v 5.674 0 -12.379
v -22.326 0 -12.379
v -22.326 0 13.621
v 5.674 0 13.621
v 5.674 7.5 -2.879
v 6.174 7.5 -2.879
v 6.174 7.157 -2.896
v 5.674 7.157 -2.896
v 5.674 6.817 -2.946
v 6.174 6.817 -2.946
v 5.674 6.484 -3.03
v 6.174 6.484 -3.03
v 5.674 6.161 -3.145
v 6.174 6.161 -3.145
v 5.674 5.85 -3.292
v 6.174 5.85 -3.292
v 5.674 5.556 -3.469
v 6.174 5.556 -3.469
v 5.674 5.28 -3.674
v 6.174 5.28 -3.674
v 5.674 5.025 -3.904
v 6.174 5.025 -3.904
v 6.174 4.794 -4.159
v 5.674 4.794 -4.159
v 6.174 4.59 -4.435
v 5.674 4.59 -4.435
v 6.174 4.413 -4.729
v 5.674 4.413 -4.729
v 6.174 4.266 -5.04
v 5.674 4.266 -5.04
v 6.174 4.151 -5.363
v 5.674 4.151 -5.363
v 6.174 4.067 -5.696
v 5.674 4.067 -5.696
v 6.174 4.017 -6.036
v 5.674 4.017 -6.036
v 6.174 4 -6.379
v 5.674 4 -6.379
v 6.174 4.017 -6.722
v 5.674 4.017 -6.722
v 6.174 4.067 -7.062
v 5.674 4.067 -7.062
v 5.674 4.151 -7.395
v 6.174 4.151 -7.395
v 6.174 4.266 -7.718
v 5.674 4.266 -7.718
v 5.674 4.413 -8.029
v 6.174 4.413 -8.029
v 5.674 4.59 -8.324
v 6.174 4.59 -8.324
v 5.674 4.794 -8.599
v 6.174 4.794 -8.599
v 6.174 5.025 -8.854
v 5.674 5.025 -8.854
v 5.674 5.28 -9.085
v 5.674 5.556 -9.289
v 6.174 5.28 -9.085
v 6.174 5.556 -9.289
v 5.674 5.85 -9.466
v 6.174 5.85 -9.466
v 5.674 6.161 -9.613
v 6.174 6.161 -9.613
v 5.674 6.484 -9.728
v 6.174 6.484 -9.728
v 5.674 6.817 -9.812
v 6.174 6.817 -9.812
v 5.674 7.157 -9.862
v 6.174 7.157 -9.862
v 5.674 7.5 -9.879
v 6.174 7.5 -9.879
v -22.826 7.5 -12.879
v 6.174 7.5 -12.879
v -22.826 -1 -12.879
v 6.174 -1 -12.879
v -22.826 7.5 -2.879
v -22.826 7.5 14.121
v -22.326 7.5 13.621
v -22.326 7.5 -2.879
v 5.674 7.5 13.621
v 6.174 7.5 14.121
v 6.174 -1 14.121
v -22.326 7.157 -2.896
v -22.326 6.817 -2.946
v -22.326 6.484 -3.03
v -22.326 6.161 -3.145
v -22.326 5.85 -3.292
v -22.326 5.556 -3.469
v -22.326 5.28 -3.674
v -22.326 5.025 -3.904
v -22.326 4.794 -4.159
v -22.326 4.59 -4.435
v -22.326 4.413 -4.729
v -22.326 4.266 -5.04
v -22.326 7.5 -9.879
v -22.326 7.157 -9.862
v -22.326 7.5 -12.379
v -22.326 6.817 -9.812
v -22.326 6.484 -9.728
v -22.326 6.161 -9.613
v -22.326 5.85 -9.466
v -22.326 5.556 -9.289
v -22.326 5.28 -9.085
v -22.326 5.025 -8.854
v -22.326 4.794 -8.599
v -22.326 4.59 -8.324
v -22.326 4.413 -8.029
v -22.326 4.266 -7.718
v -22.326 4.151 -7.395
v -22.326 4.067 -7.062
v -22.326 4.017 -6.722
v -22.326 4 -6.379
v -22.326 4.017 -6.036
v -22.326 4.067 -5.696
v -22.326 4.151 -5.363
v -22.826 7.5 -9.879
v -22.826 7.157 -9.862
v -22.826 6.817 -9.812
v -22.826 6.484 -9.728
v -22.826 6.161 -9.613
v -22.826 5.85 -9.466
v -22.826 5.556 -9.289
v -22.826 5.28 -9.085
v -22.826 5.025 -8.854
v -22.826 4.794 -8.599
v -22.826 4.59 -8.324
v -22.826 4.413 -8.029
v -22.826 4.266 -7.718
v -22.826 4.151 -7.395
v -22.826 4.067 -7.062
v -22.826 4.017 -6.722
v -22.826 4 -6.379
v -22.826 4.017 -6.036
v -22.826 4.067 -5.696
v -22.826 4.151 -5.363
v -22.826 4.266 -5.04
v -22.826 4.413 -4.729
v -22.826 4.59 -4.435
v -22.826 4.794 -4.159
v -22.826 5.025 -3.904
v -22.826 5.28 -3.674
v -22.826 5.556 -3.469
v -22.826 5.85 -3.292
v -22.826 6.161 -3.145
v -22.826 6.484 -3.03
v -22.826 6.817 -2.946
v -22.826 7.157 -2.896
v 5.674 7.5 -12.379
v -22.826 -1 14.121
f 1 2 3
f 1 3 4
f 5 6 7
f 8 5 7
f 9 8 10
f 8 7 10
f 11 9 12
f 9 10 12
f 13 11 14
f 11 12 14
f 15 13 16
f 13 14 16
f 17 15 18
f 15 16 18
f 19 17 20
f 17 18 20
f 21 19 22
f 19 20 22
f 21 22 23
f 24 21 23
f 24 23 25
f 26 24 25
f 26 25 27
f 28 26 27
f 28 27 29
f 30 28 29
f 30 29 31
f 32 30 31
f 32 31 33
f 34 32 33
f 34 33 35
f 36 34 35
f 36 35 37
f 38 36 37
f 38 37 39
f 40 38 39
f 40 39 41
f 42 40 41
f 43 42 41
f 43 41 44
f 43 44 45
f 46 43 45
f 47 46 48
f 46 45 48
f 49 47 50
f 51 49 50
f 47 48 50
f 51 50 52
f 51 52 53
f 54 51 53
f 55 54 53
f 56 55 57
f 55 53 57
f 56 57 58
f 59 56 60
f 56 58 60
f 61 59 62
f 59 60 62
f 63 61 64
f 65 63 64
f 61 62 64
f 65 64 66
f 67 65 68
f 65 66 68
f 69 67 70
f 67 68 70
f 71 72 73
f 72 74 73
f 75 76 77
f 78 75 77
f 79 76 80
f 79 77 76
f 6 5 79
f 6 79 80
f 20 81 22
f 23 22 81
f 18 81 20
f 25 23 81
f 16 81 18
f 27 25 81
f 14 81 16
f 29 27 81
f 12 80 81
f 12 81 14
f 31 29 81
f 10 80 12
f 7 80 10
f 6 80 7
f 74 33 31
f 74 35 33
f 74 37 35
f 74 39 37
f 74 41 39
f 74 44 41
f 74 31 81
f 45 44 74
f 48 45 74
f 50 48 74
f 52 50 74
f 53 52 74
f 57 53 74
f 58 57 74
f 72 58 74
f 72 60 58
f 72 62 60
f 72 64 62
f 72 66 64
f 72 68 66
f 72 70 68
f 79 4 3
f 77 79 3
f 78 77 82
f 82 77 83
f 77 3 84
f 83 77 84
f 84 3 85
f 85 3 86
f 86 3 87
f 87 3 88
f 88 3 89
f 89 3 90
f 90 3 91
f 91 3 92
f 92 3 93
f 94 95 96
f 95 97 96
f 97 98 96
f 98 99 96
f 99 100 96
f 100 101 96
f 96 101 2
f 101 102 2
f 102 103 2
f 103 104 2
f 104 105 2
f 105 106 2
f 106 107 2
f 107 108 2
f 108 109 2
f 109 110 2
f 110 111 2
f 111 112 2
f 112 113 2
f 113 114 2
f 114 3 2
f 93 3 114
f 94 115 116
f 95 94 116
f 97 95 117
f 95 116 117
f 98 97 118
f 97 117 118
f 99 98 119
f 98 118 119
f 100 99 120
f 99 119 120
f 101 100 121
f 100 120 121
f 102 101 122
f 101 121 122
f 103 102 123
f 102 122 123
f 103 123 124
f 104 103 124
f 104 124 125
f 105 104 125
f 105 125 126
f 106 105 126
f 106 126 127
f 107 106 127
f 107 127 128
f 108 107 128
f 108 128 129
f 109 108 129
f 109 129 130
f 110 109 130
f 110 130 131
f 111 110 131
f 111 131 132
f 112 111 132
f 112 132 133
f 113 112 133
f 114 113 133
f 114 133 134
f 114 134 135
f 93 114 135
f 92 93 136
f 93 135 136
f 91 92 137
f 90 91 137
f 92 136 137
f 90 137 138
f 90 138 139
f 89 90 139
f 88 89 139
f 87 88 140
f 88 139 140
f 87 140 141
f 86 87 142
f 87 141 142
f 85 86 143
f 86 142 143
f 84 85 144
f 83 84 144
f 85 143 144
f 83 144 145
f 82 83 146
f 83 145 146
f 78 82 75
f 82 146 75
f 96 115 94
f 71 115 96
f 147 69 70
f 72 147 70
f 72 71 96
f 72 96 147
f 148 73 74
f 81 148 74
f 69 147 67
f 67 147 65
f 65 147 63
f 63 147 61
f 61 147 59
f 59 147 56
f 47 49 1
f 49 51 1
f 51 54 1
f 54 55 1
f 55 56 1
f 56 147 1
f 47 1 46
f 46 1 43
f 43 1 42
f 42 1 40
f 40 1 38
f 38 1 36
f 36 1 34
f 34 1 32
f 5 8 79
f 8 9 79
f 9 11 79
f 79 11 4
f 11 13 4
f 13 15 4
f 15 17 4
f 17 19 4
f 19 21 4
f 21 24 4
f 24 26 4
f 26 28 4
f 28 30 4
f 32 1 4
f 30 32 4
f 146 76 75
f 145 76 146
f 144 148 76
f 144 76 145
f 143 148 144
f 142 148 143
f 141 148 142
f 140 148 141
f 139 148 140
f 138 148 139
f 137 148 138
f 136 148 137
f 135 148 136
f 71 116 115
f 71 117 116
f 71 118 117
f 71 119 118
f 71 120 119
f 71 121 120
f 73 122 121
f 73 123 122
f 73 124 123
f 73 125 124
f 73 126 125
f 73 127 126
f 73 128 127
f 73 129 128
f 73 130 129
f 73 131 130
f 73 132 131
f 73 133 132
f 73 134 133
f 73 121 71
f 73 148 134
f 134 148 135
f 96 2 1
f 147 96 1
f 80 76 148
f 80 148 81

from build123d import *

# Parameters (mm, degrees)
ESQUISSE1_W             = 29
ESQUISSE1_H             = 27
BOSS_EXTRU_1_DEPTH      = 1
BOSS_EXTRU_2_DEPTH      = 7.5
ESQUISSE1_4_W           = 0.5
ESQUISSE1_4_H           = 7
BOSS_EXTRU_3_DEPTH      = 7.5
ESQUISSE7_R             = 3.5
ENL_V_MAT_EXTRU_1_DEPTH = 0.5
ENL_V_START             = -0.5
ESQUISSE6_R             = 3.5
ENL_V_MAT_EXTRU_2_DEPTH = 0.5


with BuildPart() as part:
    # Esquisse1 → Boss.-Extru.1 (new body)
    with BuildSketch(Plane(origin=(0, 0, 0), x_dir=(1, 0, 0), z_dir=(0, 1, 0))):
        with Locations((-8.325581395, -0.620930233)):
            Rectangle(ESQUISSE1_W, ESQUISSE1_H)
    extrude(amount=-BOSS_EXTRU_1_DEPTH)

    # Esquisse1<3> → Boss.-Extru.2 (add)
    with BuildSketch(Plane(origin=(0, 0, 0), x_dir=(1, 0, 0), z_dir=(0, 1, 0))):
        Polygon((-22.325581395, 8.379069767), (-22.325581395, 12.379069767), (5.674418605, 12.379069767), (5.674418605, 6.379069767), (6.174418605, 6.379069767), (6.174418605, 12.879069767), (-22.825581395, 12.879069767), (-22.825581395, 8.379069767), align=None)
        Polygon((-22.325581395, -13.620930233), (-22.325581395, 1.379069767), (-22.825581395, 1.379069767), (-22.825581395, -14.120930233), (6.174418605, -14.120930233), (6.174418605, -0.620930233), (5.674418605, -0.620930233), (5.674418605, -13.620930233), align=None)
    extrude(amount=BOSS_EXTRU_2_DEPTH)

    # Esquisse1<4> → Boss.-Extru.3 (add)
    with BuildSketch(Plane(origin=(0, 0, 0), x_dir=(1, 0, 0), z_dir=(0, 1, 0))):
        with Locations((-22.575581395, 4.879069767)):
            Rectangle(ESQUISSE1_4_W, ESQUISSE1_4_H)
        with Locations((5.924418605, 2.879069767)):
            Rectangle(ESQUISSE1_4_W, ESQUISSE1_4_H)
    extrude(amount=BOSS_EXTRU_3_DEPTH)

    # Esquisse7 → Enlèv. mat.-Extru.1 (cut)
    with BuildSketch(Plane(origin=(6.174418605, 0, 0), x_dir=(0, 0, -1), z_dir=(1, 0, 0))):
        with Locations((6.379069767, 7.5)):
            Circle(ESQUISSE7_R)
    extrude(amount=-ENL_V_MAT_EXTRU_1_DEPTH, mode=Mode.SUBTRACT)

    # Esquisse6 → Enlèv. mat.-Extru.2 (cut)
    with BuildSketch(Plane.ZY.offset(22.825581395).offset(ENL_V_START)):
        with Locations((-6.379069767, 7.5)):
            Circle(ESQUISSE6_R)
    extrude(amount=ENL_V_MAT_EXTRU_2_DEPTH, mode=Mode.SUBTRACT)


solid = part.part
